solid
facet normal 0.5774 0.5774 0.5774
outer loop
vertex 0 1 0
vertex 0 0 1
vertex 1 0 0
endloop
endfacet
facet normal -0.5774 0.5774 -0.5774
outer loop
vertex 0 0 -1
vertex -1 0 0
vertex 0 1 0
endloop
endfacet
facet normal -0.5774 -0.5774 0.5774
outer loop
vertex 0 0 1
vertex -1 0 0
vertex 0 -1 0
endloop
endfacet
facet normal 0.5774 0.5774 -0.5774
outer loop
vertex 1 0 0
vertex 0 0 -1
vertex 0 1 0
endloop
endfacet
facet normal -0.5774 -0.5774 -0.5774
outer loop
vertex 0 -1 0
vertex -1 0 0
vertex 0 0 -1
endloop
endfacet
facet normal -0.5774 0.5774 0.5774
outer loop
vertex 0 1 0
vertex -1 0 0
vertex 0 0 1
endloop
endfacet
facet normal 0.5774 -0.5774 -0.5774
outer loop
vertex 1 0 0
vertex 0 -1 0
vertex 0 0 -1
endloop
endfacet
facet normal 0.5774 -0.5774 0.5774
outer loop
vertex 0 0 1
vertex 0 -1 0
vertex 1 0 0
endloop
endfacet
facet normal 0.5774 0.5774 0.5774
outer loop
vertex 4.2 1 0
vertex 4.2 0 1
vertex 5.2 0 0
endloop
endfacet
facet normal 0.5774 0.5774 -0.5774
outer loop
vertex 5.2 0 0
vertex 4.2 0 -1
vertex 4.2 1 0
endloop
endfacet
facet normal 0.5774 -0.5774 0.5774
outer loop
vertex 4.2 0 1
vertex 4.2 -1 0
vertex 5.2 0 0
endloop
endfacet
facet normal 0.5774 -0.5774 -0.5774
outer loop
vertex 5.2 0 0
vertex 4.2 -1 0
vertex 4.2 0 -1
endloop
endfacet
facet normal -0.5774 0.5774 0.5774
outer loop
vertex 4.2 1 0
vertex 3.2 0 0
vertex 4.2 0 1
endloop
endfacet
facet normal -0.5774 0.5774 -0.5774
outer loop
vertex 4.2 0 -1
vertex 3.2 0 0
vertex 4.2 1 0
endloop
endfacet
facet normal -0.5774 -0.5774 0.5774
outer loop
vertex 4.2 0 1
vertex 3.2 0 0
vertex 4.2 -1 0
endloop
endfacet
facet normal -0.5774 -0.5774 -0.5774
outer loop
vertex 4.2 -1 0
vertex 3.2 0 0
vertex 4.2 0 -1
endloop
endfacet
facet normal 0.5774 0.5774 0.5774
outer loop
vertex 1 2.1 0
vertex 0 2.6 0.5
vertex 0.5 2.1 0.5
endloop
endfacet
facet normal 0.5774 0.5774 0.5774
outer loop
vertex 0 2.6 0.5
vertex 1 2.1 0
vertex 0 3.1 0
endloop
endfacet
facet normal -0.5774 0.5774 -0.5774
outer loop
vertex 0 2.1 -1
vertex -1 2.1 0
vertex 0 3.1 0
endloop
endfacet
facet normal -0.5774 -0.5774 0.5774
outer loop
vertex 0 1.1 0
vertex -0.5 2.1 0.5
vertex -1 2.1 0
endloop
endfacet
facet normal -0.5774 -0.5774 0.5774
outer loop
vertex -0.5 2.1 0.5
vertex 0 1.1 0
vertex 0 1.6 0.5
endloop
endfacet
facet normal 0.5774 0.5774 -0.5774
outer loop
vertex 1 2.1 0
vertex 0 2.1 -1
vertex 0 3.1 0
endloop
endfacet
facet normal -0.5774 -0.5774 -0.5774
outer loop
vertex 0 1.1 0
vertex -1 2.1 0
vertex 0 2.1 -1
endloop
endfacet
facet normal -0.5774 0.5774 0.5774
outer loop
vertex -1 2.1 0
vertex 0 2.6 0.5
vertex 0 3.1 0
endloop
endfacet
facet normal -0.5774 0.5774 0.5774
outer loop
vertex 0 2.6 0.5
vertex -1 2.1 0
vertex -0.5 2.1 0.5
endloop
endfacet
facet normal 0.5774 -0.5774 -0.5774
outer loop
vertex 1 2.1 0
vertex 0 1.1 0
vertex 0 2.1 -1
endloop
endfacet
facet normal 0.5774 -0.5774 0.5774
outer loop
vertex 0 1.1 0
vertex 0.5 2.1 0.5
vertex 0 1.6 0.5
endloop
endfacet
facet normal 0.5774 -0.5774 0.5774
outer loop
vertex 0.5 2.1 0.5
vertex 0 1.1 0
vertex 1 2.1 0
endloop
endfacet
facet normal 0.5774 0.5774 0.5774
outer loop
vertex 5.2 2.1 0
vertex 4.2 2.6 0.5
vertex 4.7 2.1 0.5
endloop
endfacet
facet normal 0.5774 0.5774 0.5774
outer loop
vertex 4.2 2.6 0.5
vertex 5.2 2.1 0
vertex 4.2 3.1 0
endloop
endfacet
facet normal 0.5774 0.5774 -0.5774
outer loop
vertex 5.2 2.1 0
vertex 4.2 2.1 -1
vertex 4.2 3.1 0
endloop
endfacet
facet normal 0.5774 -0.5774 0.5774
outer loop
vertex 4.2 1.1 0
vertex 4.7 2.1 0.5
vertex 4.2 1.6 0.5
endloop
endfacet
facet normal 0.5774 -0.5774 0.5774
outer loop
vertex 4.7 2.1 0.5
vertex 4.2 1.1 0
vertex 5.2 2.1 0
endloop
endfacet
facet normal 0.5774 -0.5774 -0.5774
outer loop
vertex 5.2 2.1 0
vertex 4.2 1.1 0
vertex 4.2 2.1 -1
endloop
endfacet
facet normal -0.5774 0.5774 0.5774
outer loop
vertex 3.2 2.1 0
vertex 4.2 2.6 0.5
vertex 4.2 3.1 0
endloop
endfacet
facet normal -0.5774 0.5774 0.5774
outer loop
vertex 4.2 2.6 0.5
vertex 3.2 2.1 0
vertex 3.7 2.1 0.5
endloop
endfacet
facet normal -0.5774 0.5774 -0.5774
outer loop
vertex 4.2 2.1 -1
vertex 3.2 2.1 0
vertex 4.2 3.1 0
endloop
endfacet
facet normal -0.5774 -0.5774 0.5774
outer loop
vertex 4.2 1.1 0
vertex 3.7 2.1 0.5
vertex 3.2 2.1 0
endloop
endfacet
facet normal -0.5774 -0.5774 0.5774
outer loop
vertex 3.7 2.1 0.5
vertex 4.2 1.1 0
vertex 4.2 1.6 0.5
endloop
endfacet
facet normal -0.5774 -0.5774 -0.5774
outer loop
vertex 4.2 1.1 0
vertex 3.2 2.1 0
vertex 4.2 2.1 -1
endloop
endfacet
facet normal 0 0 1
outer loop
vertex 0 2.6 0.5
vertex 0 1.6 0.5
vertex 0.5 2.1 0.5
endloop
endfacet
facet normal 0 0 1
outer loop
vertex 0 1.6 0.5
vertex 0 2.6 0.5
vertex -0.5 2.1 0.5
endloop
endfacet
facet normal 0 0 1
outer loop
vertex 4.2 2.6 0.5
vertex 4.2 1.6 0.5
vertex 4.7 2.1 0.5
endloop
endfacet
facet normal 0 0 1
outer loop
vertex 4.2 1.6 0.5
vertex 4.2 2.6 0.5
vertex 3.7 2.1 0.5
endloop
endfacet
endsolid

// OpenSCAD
module polyhedrons() {
 polyhedron(points = [[1,0,0],[-1,0,0],[0,1,0],[0,-1,0],[0,0,1],[0,0,-1]],
            faces = [[0,4,2],[0,2,5],[0,3,4],[0,5,3],[1,2,4],[1,5,2],[1,4,3], [1,3,5]]);

 // One face flipped
 translate([2.1,0,0])
  polyhedron(points = [[1,0,0],[-1,0,0],[0,1,0],[0,-1,0],[0,0,1],[0,0,-1]],
            faces = [[0,4,2],[0,2,5],[0,3,4],[0,5,3],[1,2,4],[1,5,2],[1,3,4], [1,3,5]]);

 // All faces flipped
 translate([4.2,0,0])
  polyhedron(points = [[1,0,0],[-1,0,0],[0,1,0],[0,-1,0],[0,0,1],[0,0,-1]],
            faces = [[0,2,4],[0,5,2],[0,4,3],[0,3,5],[1,4,2],[1,2,5],[1,3,4], [1,5,3]]);
}

polyhedrons();
translate([0,2.1,0]) difference() {
  polyhedrons();
  translate([3,0,2]) cube([8,3,3], center=true);
}

// don't crash (issue #703)
polyhedron(points = undef, faces = [[1, 2, 3]]);
polyhedron(points = [[0,0,0],[1,1,1]], faces = undef);
// More malformed polyhedrons
polyhedron();
polyhedron(points=[0], faces = [[0]]);
